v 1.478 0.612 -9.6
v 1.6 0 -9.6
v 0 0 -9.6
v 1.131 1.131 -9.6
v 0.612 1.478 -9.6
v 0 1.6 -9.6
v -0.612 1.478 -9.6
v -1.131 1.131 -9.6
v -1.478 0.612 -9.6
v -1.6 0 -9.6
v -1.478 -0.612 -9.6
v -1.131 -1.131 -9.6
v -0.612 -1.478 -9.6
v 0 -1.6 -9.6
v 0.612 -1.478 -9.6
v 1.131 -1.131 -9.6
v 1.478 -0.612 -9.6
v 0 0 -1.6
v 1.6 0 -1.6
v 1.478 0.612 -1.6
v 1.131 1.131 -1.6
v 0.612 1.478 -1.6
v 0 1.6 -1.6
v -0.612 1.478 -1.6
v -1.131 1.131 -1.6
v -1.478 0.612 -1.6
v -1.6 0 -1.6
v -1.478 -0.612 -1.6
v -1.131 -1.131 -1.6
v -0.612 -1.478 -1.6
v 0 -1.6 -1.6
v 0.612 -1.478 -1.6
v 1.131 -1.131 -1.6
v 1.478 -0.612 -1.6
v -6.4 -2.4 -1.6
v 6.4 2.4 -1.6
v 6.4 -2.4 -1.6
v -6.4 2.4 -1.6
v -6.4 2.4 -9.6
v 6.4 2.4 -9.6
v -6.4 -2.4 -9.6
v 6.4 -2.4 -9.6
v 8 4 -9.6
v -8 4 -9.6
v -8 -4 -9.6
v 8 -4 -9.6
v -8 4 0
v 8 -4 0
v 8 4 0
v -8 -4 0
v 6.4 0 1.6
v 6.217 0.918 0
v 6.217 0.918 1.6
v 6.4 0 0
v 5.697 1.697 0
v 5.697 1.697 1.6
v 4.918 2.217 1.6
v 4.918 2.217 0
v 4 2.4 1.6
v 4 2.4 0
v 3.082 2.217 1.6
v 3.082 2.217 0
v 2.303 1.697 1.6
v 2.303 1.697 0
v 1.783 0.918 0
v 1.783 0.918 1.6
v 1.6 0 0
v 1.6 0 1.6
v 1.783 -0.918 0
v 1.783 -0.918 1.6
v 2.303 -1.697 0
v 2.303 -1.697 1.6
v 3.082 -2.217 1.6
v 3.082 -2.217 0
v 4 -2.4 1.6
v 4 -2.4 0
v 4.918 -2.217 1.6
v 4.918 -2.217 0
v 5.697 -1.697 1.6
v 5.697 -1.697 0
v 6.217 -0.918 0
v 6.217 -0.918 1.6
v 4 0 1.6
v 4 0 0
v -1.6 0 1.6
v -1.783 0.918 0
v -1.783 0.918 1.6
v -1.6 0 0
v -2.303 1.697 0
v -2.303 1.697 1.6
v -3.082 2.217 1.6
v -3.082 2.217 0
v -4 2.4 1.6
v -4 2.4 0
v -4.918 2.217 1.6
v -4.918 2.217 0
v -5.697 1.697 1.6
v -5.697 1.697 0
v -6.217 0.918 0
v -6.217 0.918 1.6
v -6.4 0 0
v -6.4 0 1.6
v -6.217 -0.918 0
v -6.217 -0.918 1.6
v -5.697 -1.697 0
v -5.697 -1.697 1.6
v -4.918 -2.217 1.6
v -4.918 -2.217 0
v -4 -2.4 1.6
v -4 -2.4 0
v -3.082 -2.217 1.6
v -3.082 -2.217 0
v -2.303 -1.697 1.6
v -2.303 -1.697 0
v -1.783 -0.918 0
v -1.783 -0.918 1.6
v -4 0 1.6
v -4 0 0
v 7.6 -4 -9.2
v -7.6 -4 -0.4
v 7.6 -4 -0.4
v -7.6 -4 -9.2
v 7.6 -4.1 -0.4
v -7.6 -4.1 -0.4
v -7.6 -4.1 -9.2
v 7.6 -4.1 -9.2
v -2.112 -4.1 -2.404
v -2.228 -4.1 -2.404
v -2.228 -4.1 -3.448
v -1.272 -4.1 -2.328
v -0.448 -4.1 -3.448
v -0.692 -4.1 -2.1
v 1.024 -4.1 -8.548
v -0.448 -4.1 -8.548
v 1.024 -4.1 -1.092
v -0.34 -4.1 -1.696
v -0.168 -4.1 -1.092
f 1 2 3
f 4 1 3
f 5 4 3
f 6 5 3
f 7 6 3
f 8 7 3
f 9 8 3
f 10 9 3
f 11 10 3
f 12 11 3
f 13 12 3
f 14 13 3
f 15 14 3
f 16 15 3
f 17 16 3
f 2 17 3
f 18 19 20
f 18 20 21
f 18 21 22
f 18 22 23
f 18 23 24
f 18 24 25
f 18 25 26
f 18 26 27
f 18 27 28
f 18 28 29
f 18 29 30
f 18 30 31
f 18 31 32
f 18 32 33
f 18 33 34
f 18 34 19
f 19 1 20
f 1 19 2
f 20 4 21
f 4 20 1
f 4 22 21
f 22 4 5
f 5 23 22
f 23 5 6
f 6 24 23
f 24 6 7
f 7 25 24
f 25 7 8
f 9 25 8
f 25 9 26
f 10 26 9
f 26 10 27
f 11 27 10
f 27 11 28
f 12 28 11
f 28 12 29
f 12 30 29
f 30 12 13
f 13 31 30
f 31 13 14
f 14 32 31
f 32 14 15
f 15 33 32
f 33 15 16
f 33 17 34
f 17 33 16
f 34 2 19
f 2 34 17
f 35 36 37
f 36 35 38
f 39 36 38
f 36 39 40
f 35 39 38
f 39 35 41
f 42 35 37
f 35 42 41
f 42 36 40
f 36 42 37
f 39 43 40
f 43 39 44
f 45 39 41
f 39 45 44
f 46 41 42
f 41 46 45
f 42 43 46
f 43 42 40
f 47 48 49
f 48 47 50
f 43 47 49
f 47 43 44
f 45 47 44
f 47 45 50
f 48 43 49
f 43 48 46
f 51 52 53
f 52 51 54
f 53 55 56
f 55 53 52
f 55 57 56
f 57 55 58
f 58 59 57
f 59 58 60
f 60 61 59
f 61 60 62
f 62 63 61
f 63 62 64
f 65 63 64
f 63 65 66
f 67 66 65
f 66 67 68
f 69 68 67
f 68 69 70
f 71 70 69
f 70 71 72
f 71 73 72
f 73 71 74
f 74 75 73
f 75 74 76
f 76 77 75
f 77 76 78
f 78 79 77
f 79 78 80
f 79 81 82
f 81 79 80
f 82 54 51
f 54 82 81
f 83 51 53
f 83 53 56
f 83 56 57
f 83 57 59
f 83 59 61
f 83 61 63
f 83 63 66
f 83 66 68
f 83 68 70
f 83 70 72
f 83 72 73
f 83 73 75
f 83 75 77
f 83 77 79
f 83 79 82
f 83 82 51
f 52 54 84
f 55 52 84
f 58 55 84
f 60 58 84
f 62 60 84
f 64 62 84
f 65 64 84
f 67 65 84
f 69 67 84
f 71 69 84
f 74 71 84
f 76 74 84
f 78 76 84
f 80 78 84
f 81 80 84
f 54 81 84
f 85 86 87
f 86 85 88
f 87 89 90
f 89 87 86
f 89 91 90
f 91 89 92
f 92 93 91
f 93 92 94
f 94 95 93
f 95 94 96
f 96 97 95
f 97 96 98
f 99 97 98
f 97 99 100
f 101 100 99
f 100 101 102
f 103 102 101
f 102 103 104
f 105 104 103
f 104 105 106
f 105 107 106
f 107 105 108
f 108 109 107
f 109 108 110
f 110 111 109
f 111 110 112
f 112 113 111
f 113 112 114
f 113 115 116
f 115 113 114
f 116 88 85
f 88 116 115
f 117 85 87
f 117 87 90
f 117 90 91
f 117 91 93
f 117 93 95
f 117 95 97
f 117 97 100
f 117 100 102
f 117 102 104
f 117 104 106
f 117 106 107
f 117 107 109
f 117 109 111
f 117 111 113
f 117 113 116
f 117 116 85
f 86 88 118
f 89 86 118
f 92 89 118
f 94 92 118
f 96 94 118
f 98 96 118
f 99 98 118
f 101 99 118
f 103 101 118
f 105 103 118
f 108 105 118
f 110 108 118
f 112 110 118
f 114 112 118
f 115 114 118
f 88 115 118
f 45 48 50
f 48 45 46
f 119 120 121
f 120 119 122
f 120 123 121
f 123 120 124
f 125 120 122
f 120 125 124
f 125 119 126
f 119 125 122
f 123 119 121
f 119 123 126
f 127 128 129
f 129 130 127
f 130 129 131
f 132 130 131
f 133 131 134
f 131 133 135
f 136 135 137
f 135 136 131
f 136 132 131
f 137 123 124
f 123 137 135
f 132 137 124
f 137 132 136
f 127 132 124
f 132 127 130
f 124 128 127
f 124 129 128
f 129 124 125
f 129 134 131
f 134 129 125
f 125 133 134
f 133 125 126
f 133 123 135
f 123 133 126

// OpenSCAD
// file: ../p/4-4edge.scad
use <../lib.scad>
function ldraw_lib__4_4edge() = [
// 0 Circle 1.0
// 0 Name: 4-4edge.dat
// 0 Author: James Jessiman
// 0 !LDRAW_ORG Primitive UPDATE 2017-01
// 0 !LICENSE Licensed under CC BY 2.0 and CC BY 4.0 : see CAreadme.txt
// 
// 0 BFC CERTIFY CCW
  [0,"BFC","CERTIFY"],
  [0,"BFC","CCW"],
// 
// 0 !HISTORY 1998-12-15 [PTadmin] Official Update 1998-10
// 0 !HISTORY 2005-12-28 [PTadmin] Official Update 2005-01
// 0 !HISTORY 2007-06-24 [PTadmin] Header formatted for Contributor Agreement
// 0 !HISTORY 2008-07-01 [PTadmin] Official Update 2008-01
// 0 !HISTORY 2017-01-15 [Steffen] BFCed
// 0 !HISTORY 2017-12-30 [PTadmin] Official Update 2017-01
// 
// 
// 2 24 1 0 0 0.9239 0 0.3827
  [2,24,1,0,0,0.9239,0,0.3827],
// 2 24 0.9239 0 0.3827 0.7071 0 0.7071
  [2,24,0.9239,0,0.3827,0.7071,0,0.7071],
// 2 24 0.7071 0 0.7071 0.3827 0 0.9239
  [2,24,0.7071,0,0.7071,0.3827,0,0.9239],
// 2 24 0.3827 0 0.9239 0 0 1
  [2,24,0.3827,0,0.9239,0,0,1],
// 2 24 0 0 1 -0.3827 0 0.9239
  [2,24,0,0,1,-0.3827,0,0.9239],
// 2 24 -0.3827 0 0.9239 -0.7071 0 0.7071
  [2,24,-0.3827,0,0.9239,-0.7071,0,0.7071],
// 2 24 -0.7071 0 0.7071 -0.9239 0 0.3827
  [2,24,-0.7071,0,0.7071,-0.9239,0,0.3827],
// 2 24 -0.9239 0 0.3827 -1 0 -0
  [2,24,-0.9239,0,0.3827,-1,0,-0],
// 2 24 -1 0 -0 -0.9239 0 -0.3827
  [2,24,-1,0,-0,-0.9239,0,-0.3827],
// 2 24 -0.9239 0 -0.3827 -0.7071 0 -0.7071
  [2,24,-0.9239,0,-0.3827,-0.7071,0,-0.7071],
// 2 24 -0.7071 0 -0.7071 -0.3827 0 -0.9239
  [2,24,-0.7071,0,-0.7071,-0.3827,0,-0.9239],
// 2 24 -0.3827 0 -0.9239 0 0 -1
  [2,24,-0.3827,0,-0.9239,0,0,-1],
// 2 24 0 0 -1 0.3827 0 -0.9239
  [2,24,0,0,-1,0.3827,0,-0.9239],
// 2 24 0.3827 0 -0.9239 0.7071 0 -0.7071
  [2,24,0.3827,0,-0.9239,0.7071,0,-0.7071],
// 2 24 0.7071 0 -0.7071 0.9239 0 -0.3827
  [2,24,0.7071,0,-0.7071,0.9239,0,-0.3827],
// 2 24 0.9239 0 -0.3827 1 0 0
  [2,24,0.9239,0,-0.3827,1,0,0],
];
module ldraw_lib__4_4edge(step=0, col=false, unit=2/5, alt=false, line=0.2, solid=!$preview)
    makepoly(ldraw_lib__4_4edge(), step=step, col=col, unit=unit, alt=alt, line=line, solid=solid);
ldraw_lib__4_4edge(line=0.2);
// file: ../p/4-4disc.scad
use <../lib.scad>
function ldraw_lib__4_4disc() = [
// 0 Disc 1.0
// 0 Name: 4-4disc.dat
// 0 Author: James Jessiman
// 0 !LDRAW_ORG Primitive UPDATE 2002-02
// 0 !LICENSE Licensed under CC BY 2.0 and CC BY 4.0 : see CAreadme.txt
// 
// 0 BFC CERTIFY CCW
  [0,"BFC","CERTIFY"],
  [0,"BFC","CCW"],
// 
// 0 !HISTORY 1998-12-15 [PTadmin] Official Update 1998-10
// 0 !HISTORY 2002-03-23 [sbliss] Added BFC statement
// 0 !HISTORY 2002-04-25 [PTadmin] Official Update 2002-02
// 0 !HISTORY 2007-06-24 [PTadmin] Header formatted for Contributor Agreement
// 0 !HISTORY 2008-07-01 [PTadmin] Official Update 2008-01
// 
// 
// 3 16 0 0 0 1 0 0 0.9239 0 0.3827
  [3,16,0,0,0,1,0,0,0.9239,0,0.3827],
// 3 16 0 0 0 0.9239 0 0.3827 0.7071 0 0.7071
  [3,16,0,0,0,0.9239,0,0.3827,0.7071,0,0.7071],
// 3 16 0 0 0 0.7071 0 0.7071 0.3827 0 0.9239
  [3,16,0,0,0,0.7071,0,0.7071,0.3827,0,0.9239],
// 3 16 0 0 0 0.3827 0 0.9239 0 0 1
  [3,16,0,0,0,0.3827,0,0.9239,0,0,1],
// 3 16 0 0 0 0 0 1 -0.3827 0 0.9239
  [3,16,0,0,0,0,0,1,-0.3827,0,0.9239],
// 3 16 0 0 0 -0.3827 0 0.9239 -0.7071 0 0.7071
  [3,16,0,0,0,-0.3827,0,0.9239,-0.7071,0,0.7071],
// 3 16 0 0 0 -0.7071 0 0.7071 -0.9239 0 0.3827
  [3,16,0,0,0,-0.7071,0,0.7071,-0.9239,0,0.3827],
// 3 16 0 0 0 -0.9239 0 0.3827 -1 0 -0
  [3,16,0,0,0,-0.9239,0,0.3827,-1,0,-0],
// 3 16 0 0 0 -1 0 -0 -0.9239 0 -0.3827
  [3,16,0,0,0,-1,0,-0,-0.9239,0,-0.3827],
// 3 16 0 0 0 -0.9239 0 -0.3827 -0.7071 0 -0.7071
  [3,16,0,0,0,-0.9239,0,-0.3827,-0.7071,0,-0.7071],
// 3 16 0 0 0 -0.7071 0 -0.7071 -0.3827 0 -0.9239
  [3,16,0,0,0,-0.7071,0,-0.7071,-0.3827,0,-0.9239],
// 3 16 0 0 0 -0.3827 0 -0.9239 0 0 -1
  [3,16,0,0,0,-0.3827,0,-0.9239,0,0,-1],
// 3 16 0 0 0 0 0 -1 0.3827 0 -0.9239
  [3,16,0,0,0,0,0,-1,0.3827,0,-0.9239],
// 3 16 0 0 0 0.3827 0 -0.9239 0.7071 0 -0.7071
  [3,16,0,0,0,0.3827,0,-0.9239,0.7071,0,-0.7071],
// 3 16 0 0 0 0.7071 0 -0.7071 0.9239 0 -0.3827
  [3,16,0,0,0,0.7071,0,-0.7071,0.9239,0,-0.3827],
// 3 16 0 0 0 0.9239 0 -0.3827 1 0 0
  [3,16,0,0,0,0.9239,0,-0.3827,1,0,0],
// 0
];
module ldraw_lib__4_4disc(step=0, col=false, unit=2/5, alt=false, line=0.2, solid=!$preview)
    makepoly(ldraw_lib__4_4disc(), step=step, col=col, unit=unit, alt=alt, line=line, solid=solid);
ldraw_lib__4_4disc(line=0.2);
// file: ../p/4-4cyli.scad
use <../lib.scad>
$fa=1; $fs=0.2;
function ldraw_lib__4_4cyli(realsolid=false) = [
// 0 Cylinder 1.0
// 0 Name: 4-4cyli.dat
// 0 Author: James Jessiman
// 0 !LDRAW_ORG Primitive UPDATE 2005-01
// 0 !LICENSE Licensed under CC BY 2.0 and CC BY 4.0 : see CAreadme.txt
// 
// 0 BFC CERTIFY CCW
  [0,"BFC","CERTIFY"],
  [0,"BFC","CCW"],
// 
// 0 !HISTORY 1998-12-15 [PTadmin] Official Update 1998-10
// 0 !HISTORY 2002-03-23 [sbliss] Added BFC statement; merged headers from files in distributions LDraw 0.27 and Complete.
// 0 !HISTORY 2002-04-25 [PTadmin] Official Update 2002-02
// 0 !HISTORY 2004-12-14 [guyvivan] BFC CCW
// 0 !HISTORY 2005-12-28 [PTadmin] Official Update 2005-01
// 0 !HISTORY 2007-06-24 [PTadmin] Header formatted for Contributor Agreement
// 0 !HISTORY 2008-07-01 [PTadmin] Official Update 2008-01
// 
// 
// 4 16 1 1 0 0.9239 1 0.3827 0.9239 0 0.3827 1 0 0
  [4,16,1,1,0,0.9239,1,0.3827,0.9239,0,0.3827,1,0,0],
// 5 24 1 0 0 1 1 0 0.9239 0 0.3827 0.9239 0 -0.3827
  [5,24,1,0,0,1,1,0,0.9239,0,0.3827,0.9239,0,-0.3827],
// 4 16 0.9239 1 0.3827 0.7071 1 0.7071 0.7071 0 0.7071 0.9239 0 0.3827
  [4,16,0.9239,1,0.3827,0.7071,1,0.7071,0.7071,0,0.7071,0.9239,0,0.3827],
// 5 24 0.9239 0 0.3827 0.9239 1 0.3827 0.7071 0 0.7071 1 0 0
  [5,24,0.9239,0,0.3827,0.9239,1,0.3827,0.7071,0,0.7071,1,0,0],
// 4 16 0.7071 1 0.7071 0.3827 1 0.9239 0.3827 0 0.9239 0.7071 0 0.7071
  [4,16,0.7071,1,0.7071,0.3827,1,0.9239,0.3827,0,0.9239,0.7071,0,0.7071],
// 5 24 0.7071 0 0.7071 0.7071 1 0.7071 0.3827 0 0.9239 0.9239 0 0.3827
  [5,24,0.7071,0,0.7071,0.7071,1,0.7071,0.3827,0,0.9239,0.9239,0,0.3827],
// 4 16 0.3827 1 0.9239 0 1 1 0 0 1 0.3827 0 0.9239
  [4,16,0.3827,1,0.9239,0,1,1,0,0,1,0.3827,0,0.9239],
// 5 24 0.3827 0 0.9239 0.3827 1 0.9239 0 0 1 0.7071 0 0.7071
  [5,24,0.3827,0,0.9239,0.3827,1,0.9239,0,0,1,0.7071,0,0.7071],
// 4 16 0 1 1 -0.3827 1 0.9239 -0.3827 0 0.9239 0 0 1
  [4,16,0,1,1,-0.3827,1,0.9239,-0.3827,0,0.9239,0,0,1],
// 5 24 0 0 1 0 1 1 -0.3827 0 0.9239 0.3827 0 0.9239
  [5,24,0,0,1,0,1,1,-0.3827,0,0.9239,0.3827,0,0.9239],
// 4 16 -0.3827 1 0.9239 -0.7071 1 0.7071 -0.7071 0 0.7071 -0.3827 0 0.9239
  [4,16,-0.3827,1,0.9239,-0.7071,1,0.7071,-0.7071,0,0.7071,-0.3827,0,0.9239],
// 5 24 -0.3827 0 0.9239 -0.3827 1 0.9239 -0.7071 0 0.7071 0 0 1
  [5,24,-0.3827,0,0.9239,-0.3827,1,0.9239,-0.7071,0,0.7071,0,0,1],
// 4 16 -0.7071 1 0.7071 -0.9239 1 0.3827 -0.9239 0 0.3827 -0.7071 0 0.7071
  [4,16,-0.7071,1,0.7071,-0.9239,1,0.3827,-0.9239,0,0.3827,-0.7071,0,0.7071],
// 5 24 -0.7071 0 0.7071 -0.7071 1 0.7071 -0.9239 0 0.3827 -0.3827 0 0.9239
  [5,24,-0.7071,0,0.7071,-0.7071,1,0.7071,-0.9239,0,0.3827,-0.3827,0,0.9239],
// 4 16 -0.9239 1 0.3827 -1 1 0 -1 0 0 -0.9239 0 0.3827
  [4,16,-0.9239,1,0.3827,-1,1,0,-1,0,0,-0.9239,0,0.3827],
// 5 24 -0.9239 0 0.3827 -0.9239 1 0.3827 -1 0 0 -0.7071 0 0.7071
  [5,24,-0.9239,0,0.3827,-0.9239,1,0.3827,-1,0,0,-0.7071,0,0.7071],
// 4 16 -1 1 0 -0.9239 1 -0.3827 -0.9239 0 -0.3827 -1 0 0
  [4,16,-1,1,0,-0.9239,1,-0.3827,-0.9239,0,-0.3827,-1,0,0],
// 5 24 -1 0 0 -1 1 0 -0.9239 0 -0.3827 -0.9239 0 0.3827
  [5,24,-1,0,0,-1,1,0,-0.9239,0,-0.3827,-0.9239,0,0.3827],
// 4 16 -0.9239 1 -0.3827 -0.7071 1 -0.7071 -0.7071 0 -0.7071 -0.9239 0 -0.3827
  [4,16,-0.9239,1,-0.3827,-0.7071,1,-0.7071,-0.7071,0,-0.7071,-0.9239,0,-0.3827],
// 5 24 -0.9239 0 -0.3827 -0.9239 1 -0.3827 -0.7071 0 -0.7071 -1 0 0
  [5,24,-0.9239,0,-0.3827,-0.9239,1,-0.3827,-0.7071,0,-0.7071,-1,0,0],
// 4 16 -0.7071 1 -0.7071 -0.3827 1 -0.9239 -0.3827 0 -0.9239 -0.7071 0 -0.7071
  [4,16,-0.7071,1,-0.7071,-0.3827,1,-0.9239,-0.3827,0,-0.9239,-0.7071,0,-0.7071],
// 5 24 -0.7071 0 -0.7071 -0.7071 1 -0.7071 -0.3827 0 -0.9239 -0.9239 0 -0.3827
  [5,24,-0.7071,0,-0.7071,-0.7071,1,-0.7071,-0.3827,0,-0.9239,-0.9239,0,-0.3827],
// 4 16 -0.3827 1 -0.9239 0 1 -1 0 0 -1 -0.3827 0 -0.9239
  [4,16,-0.3827,1,-0.9239,0,1,-1,0,0,-1,-0.3827,0,-0.9239],
// 5 24 -0.3827 0 -0.9239 -0.3827 1 -0.9239 0 0 -1 -0.7071 0 -0.7071
  [5,24,-0.3827,0,-0.9239,-0.3827,1,-0.9239,0,0,-1,-0.7071,0,-0.7071],
// 4 16 0 1 -1 0.3827 1 -0.9239 0.3827 0 -0.9239 0 0 -1
  [4,16,0,1,-1,0.3827,1,-0.9239,0.3827,0,-0.9239,0,0,-1],
// 5 24 0 0 -1 0 1 -1 0.3827 0 -0.9239 -0.3827 0 -0.9239
  [5,24,0,0,-1,0,1,-1,0.3827,0,-0.9239,-0.3827,0,-0.9239],
// 4 16 0.3827 1 -0.9239 0.7071 1 -0.7071 0.7071 0 -0.7071 0.3827 0 -0.9239
  [4,16,0.3827,1,-0.9239,0.7071,1,-0.7071,0.7071,0,-0.7071,0.3827,0,-0.9239],
// 5 24 0.3827 0 -0.9239 0.3827 1 -0.9239 0.7071 0 -0.7071 0 0 -1
  [5,24,0.3827,0,-0.9239,0.3827,1,-0.9239,0.7071,0,-0.7071,0,0,-1],
// 4 16 0.7071 1 -0.7071 0.9239 1 -0.3827 0.9239 0 -0.3827 0.7071 0 -0.7071
  [4,16,0.7071,1,-0.7071,0.9239,1,-0.3827,0.9239,0,-0.3827,0.7071,0,-0.7071],
// 5 24 0.7071 0 -0.7071 0.7071 1 -0.7071 0.9239 0 -0.3827 0.3827 0 -0.9239
  [5,24,0.7071,0,-0.7071,0.7071,1,-0.7071,0.9239,0,-0.3827,0.3827,0,-0.9239],
// 4 16 0.9239 1 -0.3827 1 1 0 1 0 0 0.9239 0 -0.3827
  [4,16,0.9239,1,-0.3827,1,1,0,1,0,0,0.9239,0,-0.3827],
// 5 24 0.9239 0 -0.3827 0.9239 1 -0.3827 1 0 0 0.7071 0 -0.7071
  [5,24,0.9239,0,-0.3827,0.9239,1,-0.3827,1,0,0,0.7071,0,-0.7071],
// 0
];
module ldraw_lib__4_4cyli(step=0, col=false, unit=2/5, alt=false, line=0.2, solid=!$preview)
    makepoly(ldraw_lib__4_4cyli(solid), step=step, col=col, unit=unit, alt=alt, line=line, solid=solid);
ldraw_lib__4_4cyli(line=0.2);
// file: ../p/stud3.scad
use <../lib.scad>
use <4-4cyli.scad>
use <4-4disc.scad>
use <4-4edge.scad>
function ldraw_lib__stud3() = [
// 0 Stud Tube Solid
// 0 Name: stud3.dat
// 0 Author: James Jessiman
// 0 !LDRAW_ORG Primitive UPDATE 2012-01
// 0 !LICENSE Licensed under CC BY 4.0 : see CAreadme.txt
// 
// 0 BFC CERTIFY CCW
  [0,"BFC","CERTIFY"],
  [0,"BFC","CCW"],
// 
// 0 !HISTORY 2002-04-04 [sbliss] Modified for BFC compliance
// 0 !HISTORY 2002-04-25 [PTadmin] Official Update 2002-02
// 0 !HISTORY 2007-06-24 [PTadmin] Header formatted for Contributor Agreement
// 0 !HISTORY 2008-07-01 [PTadmin] Official Update 2008-01
// 0 !HISTORY 2012-02-16 [Philo] Changed to CCW
// 0 !HISTORY 2012-03-30 [PTadmin] Official Update 2012-01
// 
// 
// 1 16 0 -4 0 4 0 0 0 1 0 0 0 4 4-4edge.dat
  [1,16,0,-4,0,4,0,0,0,1,0,0,0,4, ldraw_lib__4_4edge()],
// 1 16 0 0 0 4 0 0 0 1 0 0 0 4 4-4edge.dat
  [1,16,0,0,0,4,0,0,0,1,0,0,0,4, ldraw_lib__4_4edge()],
// 1 16 0 -4 0 4 0 0 0 1 0 0 0 4 4-4disc.dat
  [1,16,0,-4,0,4,0,0,0,1,0,0,0,4, ldraw_lib__4_4disc()],
  [-1,16,0,0,0,4,0,0,0,-1,0,0,0,4, ldraw_lib__4_4disc()],
// 1 16 0 -4 0 4 0 0 0 4 0 0 0 4 4-4cyli.dat
  [1,16,0,-4,0,4,0,0,0,4,0,0,0,4, ldraw_lib__4_4cyli()],
];
module ldraw_lib__stud3(step=0, col=false, unit=2/5, alt=false, line=0.2, solid=!$preview)
    makepoly(ldraw_lib__stud3(), step=step, col=col, unit=unit, alt=alt, line=line, solid=solid);
ldraw_lib__stud3(line=0.2);
// file: ../p/stud.scad
use <../lib.scad>
use <4-4cyli.scad>
use <4-4disc.scad>
use <4-4edge.scad>
function ldraw_lib__stud() = [
// 0 Stud
// 0 Name: stud.dat
// 0 Author: James Jessiman
// 0 !LDRAW_ORG Primitive UPDATE 2012-01
// 0 !LICENSE Licensed under CC BY 4.0 : see CAreadme.txt
// 
// 0 BFC CERTIFY CCW
  [0,"BFC","CERTIFY"],
  [0,"BFC","CCW"],
// 
// 0 !HISTORY 2002-04-04 [sbliss] Modified for BFC compliance
// 0 !HISTORY 2002-04-25 [PTadmin] Official Update 2002-02
// 0 !HISTORY 2007-06-24 [PTadmin] Header formatted for Contributor Agreement
// 0 !HISTORY 2008-07-01 [PTadmin] Official Update 2008-01
// 0 !HISTORY 2012-02-16 [Philo] Changed to CCW
// 0 !HISTORY 2012-03-30 [PTadmin] Official Update 2012-01
// 
// 
// 1 16 0 0 0 6 0 0 0 1 0 0 0 6 4-4edge.dat
  [1,16,0,0,0,6,0,0,0,1,0,0,0,6, ldraw_lib__4_4edge()],
// 1 16 0 -4 0 6 0 0 0 1 0 0 0 6 4-4edge.dat
  [1,16,0,-4,0,6,0,0,0,1,0,0,0,6, ldraw_lib__4_4edge()],
// 1 16 0 0 0 6 0 0 0 -4 0 0 0 6 4-4cyli.dat
  [1,16,0,0,0,6,0,0,0,-4,0,0,0,6, ldraw_lib__4_4cyli()],
// 1 16 0 -4 0 6 0 0 0 1 0 0 0 6 4-4disc.dat
  [1,16,0,-4,0,6,0,0,0,1,0,0,0,6, ldraw_lib__4_4disc()],
  [-1,16,0,0,0,6,0,0,0,-1,0,0,0,6, ldraw_lib__4_4disc()],
];
module ldraw_lib__stud(step=0, col=false, unit=2/5, alt=false, line=0.2, solid=!$preview)
    makepoly(ldraw_lib__stud(), step=step, col=col, unit=unit, alt=alt, line=line, solid=solid);
ldraw_lib__stud(line=0.2);
// file: ../p/box5.scad
use <../lib.scad>
function ldraw_lib__box5() = [
// 0 Box with 5 Faces and All Edges
// 0 Name: box5.dat
// 0 Author: James Jessiman
// 0 !LDRAW_ORG Primitive UPDATE 2012-01
// 0 !LICENSE Licensed under CC BY 2.0 and CC BY 4.0 : see CAreadme.txt
// 
// 0 BFC CERTIFY CCW
  [0,"BFC","CERTIFY"],
  [0,"BFC","CCW"],
// 
// 0 !HISTORY 2002-04-03 [sbliss] Modified for BFC compliance
// 0 !HISTORY 2002-04-25 [PTadmin] Official Update 2002-02
// 0 !HISTORY 2007-06-24 [PTadmin] Header formatted for Contributor Agreement
// 0 !HISTORY 2008-07-01 [PTadmin] Official Update 2008-01
// 0 !HISTORY 2012-02-16 [Philo] Changed to CCW
// 0 !HISTORY 2012-03-30 [PTadmin] Official Update 2012-01
// 
// 
// 2 24 1 1 1 -1 1 1
  [2,24,1,1,1,-1,1,1],
// 2 24 -1 1 1 -1 1 -1
  [2,24,-1,1,1,-1,1,-1],
// 2 24 -1 1 -1 1 1 -1
  [2,24,-1,1,-1,1,1,-1],
// 2 24 1 1 -1 1 1 1
  [2,24,1,1,-1,1,1,1],
// 2 24 1 0 1 -1 0 1
  [2,24,1,0,1,-1,0,1],
// 2 24 -1 0 1 -1 0 -1
  [2,24,-1,0,1,-1,0,-1],
// 2 24 -1 0 -1 1 0 -1
  [2,24,-1,0,-1,1,0,-1],
// 2 24 1 0 -1 1 0 1
  [2,24,1,0,-1,1,0,1],
// 2 24 1 0 1 1 1 1
  [2,24,1,0,1,1,1,1],
// 2 24 -1 0 1 -1 1 1
  [2,24,-1,0,1,-1,1,1],
// 2 24 1 0 -1 1 1 -1
  [2,24,1,0,-1,1,1,-1],
// 2 24 -1 0 -1 -1 1 -1
  [2,24,-1,0,-1,-1,1,-1],
// 4 16 -1 1 1 1 1 1 1 1 -1 -1 1 -1
  [4,16,-1,1,1,1,1,1,1,1,-1,-1,1,-1],
// 4 16 -1 1 1 -1 0 1 1 0 1 1 1 1
  [4,16,-1,1,1,-1,0,1,1,0,1,1,1,1],
// 4 16 -1 1 -1 -1 0 -1 -1 0 1 -1 1 1
  [4,16,-1,1,-1,-1,0,-1,-1,0,1,-1,1,1],
// 4 16 1 1 -1 1 0 -1 -1 0 -1 -1 1 -1
  [4,16,1,1,-1,1,0,-1,-1,0,-1,-1,1,-1],
// 4 16 1 1 1 1 0 1 1 0 -1 1 1 -1
  [4,16,1,1,1,1,0,1,1,0,-1,1,1,-1],
];
makepoly(ldraw_lib__box5(), line=0.2);
// file: ../p/box4t.scad
use <../lib.scad>
function ldraw_lib__box4t() = [
// 0 Box with 4 Adjacent Faces and All Edges
// 0 Name: box4t.dat
// 0 Author: Tore Eriksson [Tore_Eriksson]
// 0 !LDRAW_ORG Primitive UPDATE 2003-02
// 0 !LICENSE Licensed under CC BY 2.0 and CC BY 4.0 : see CAreadme.txt
// 
// 0 BFC CERTIFY CCW
  [0,"BFC","CERTIFY"],
  [0,"BFC","CCW"],
// 
// 0 !HISTORY 1997-09-29 [PTadmin] Official Update 1997-15
// 0 !HISTORY 2002-08-31 [izanette] Modified with WINDZ for BFC compliance
// 0 !HISTORY 2003-08-01 [PTadmin] Official Update 2003-02
// 0 !HISTORY 2007-06-24 [PTadmin] Header formatted for Contributor Agreement
// 0 !HISTORY 2008-07-01 [PTadmin] Official Update 2008-01
// 
// 
// 2 24 1 1 1 -1 1 1
  [2,24,1,1,1,-1,1,1],
// 2 24 -1 1 1 -1 1 -1
  [2,24,-1,1,1,-1,1,-1],
// 2 24 -1 1 -1 1 1 -1
  [2,24,-1,1,-1,1,1,-1],
// 2 24 1 1 -1 1 1 1
  [2,24,1,1,-1,1,1,1],
// 2 24 1 0 1 -1 0 1
  [2,24,1,0,1,-1,0,1],
// 2 24 -1 0 1 -1 0 -1
  [2,24,-1,0,1,-1,0,-1],
// 2 24 -1 0 -1 1 0 -1
  [2,24,-1,0,-1,1,0,-1],
// 2 24 1 0 -1 1 0 1
  [2,24,1,0,-1,1,0,1],
// 2 24 1 0 1 1 1 1
  [2,24,1,0,1,1,1,1],
// 2 24 -1 0 1 -1 1 1
  [2,24,-1,0,1,-1,1,1],
// 2 24 1 0 -1 1 1 -1
  [2,24,1,0,-1,1,1,-1],
// 2 24 -1 0 -1 -1 1 -1
  [2,24,-1,0,-1,-1,1,-1],
// 4 16 1 1 1 1 1 -1 -1 1 -1 -1 1 1
  [4,16,1,1,1,1,1,-1,-1,1,-1,-1,1,1],
// 4 16 1 1 1 -1 1 1 -1 0 1 1 0 1
  [4,16,1,1,1,-1,1,1,-1,0,1,1,0,1],
// 4 16 -1 1 1 -1 1 -1 -1 0 -1 -1 0 1
  [4,16,-1,1,1,-1,1,-1,-1,0,-1,-1,0,1],
// 0 4 16 -1 1 -1 -1 0 -1 1 0 -1 1 1 -1
// 4 16 1 1 -1 1 1 1 1 0 1 1 0 -1
  [4,16,1,1,-1,1,1,1,1,0,1,1,0,-1],
// 0
];
makepoly(ldraw_lib__box4t(), line=0.2);
// file: s/3004s01.scad
use <../../lib.scad>
use <../../p/box4t.scad>
use <../../p/box5.scad>
use <../../p/stud.scad>
use <../../p/stud3.scad>
$fa=1; $fs=0.2;
function ldraw_lib__s__3004s01(realsolid=false) = [
// 0 ~Brick  1 x  2 without Front Face
// 0 Name: s\3004s01.dat
// 0 Author: James Jessiman
// 0 !LDRAW_ORG Subpart UPDATE 2003-03
// 0 !LICENSE Licensed under CC BY 2.0 and CC BY 4.0 : see CAreadme.txt
// 
// 0 BFC CERTIFY CCW
  [0,"BFC","CERTIFY"],
  [0,"BFC","CCW"],
// 
// 0 !HISTORY 2003-09-07 [jriley] Subfiling, BFC
// 0 !HISTORY 2003-12-19 [PTadmin] Official Update 2003-03
// 0 !HISTORY 2007-08-29 [PTadmin] Header formatted for Contributor Agreement
// 0 !HISTORY 2008-07-01 [PTadmin] Official Update 2008-01
// 
// 
// 1 16 0 4 0 1 0 0 0 -5 0 0 0 1 stud3.dat
  [1,16,0,4,0,1,0,0,0,-5,0,0,0,1, ldraw_lib__stud3(realsolid)],
// 0 BFC INVERTNEXT
  [0,"BFC","INVERTNEXT"],
// 1 16 0 24 0 16 0 0 0 -20 0 0 0 6 box5.dat
  [1,16,0,24,0,16,0,0,0,-20,0,0,0,6, ldraw_lib__box5(realsolid)],
// 4 16 20 24 10 16 24 6 -16 24 6 -20 24 10
  [4,16,20,24,10,16,24,6,-16,24,6,-20,24,10],
// 4 16 -20 24 10 -16 24 6 -16 24 -6 -20 24 -10
  [4,16,-20,24,10,-16,24,6,-16,24,-6,-20,24,-10],
// 4 16 -20 24 -10 -16 24 -6 16 24 -6 20 24 -10
  [4,16,-20,24,-10,-16,24,-6,16,24,-6,20,24,-10],
// 4 16 20 24 -10 16 24 -6 16 24 6 20 24 10
  [4,16,20,24,-10,16,24,-6,16,24,6,20,24,10],
// 1 16 0 24 0 20 0 0 0 -24 0 0 0 10 box4t.dat
  [1,16,0,24,0,20,0,0,0,-24,0,0,0,10, ldraw_lib__box4t(realsolid)],
// 1 16 10 0 0 1 0 0 0 1 0 0 0 1 stud.dat
  [1,16,10,0,0,1,0,0,0,1,0,0,0,1, ldraw_lib__stud(realsolid)],
// 1 16 -10 0 0 1 0 0 0 1 0 0 0 1 stud.dat
  [1,16,-10,0,0,1,0,0,0,1,0,0,0,1, ldraw_lib__stud(realsolid)],
// 0
];
module ldraw_lib__s__3004s01(step=0, col=false, unit=2/5, alt=false, line=0.2, solid=!$preview)
    makepoly(ldraw_lib__s__3004s01(solid), step=step, col=col, unit=unit, alt=alt, line=line, solid=solid);
ldraw_lib__s__3004s01(line=0.2);
// file: s/004452bs02.scad
use <../../lib.scad>
function ldraw_lib__s__004452bs02() = [
// 0 ~Sticker  1.1 x  1.9 with Number "1" - Background
// 0 Name: s\004452bs02.dat
// 0 Author: Takeshi Takahashi [RainbowDolphin]
// 0 !LDRAW_ORG Subpart UPDATE 2022-04
// 0 !LICENSE Licensed under CC BY 2.0 and CC BY 4.0 : see CAreadme.txt
// 
// 0 BFC CERTIFY CCW
  [0,"BFC","CERTIFY"],
  [0,"BFC","CCW"],
// 
// 0 !HISTORY 2022-07-18 [PTadmin] Official Update 2022-04
// 
// 
// 4 16 -19 -.25 11 -.42 -.25 9.27 2.56 -.25 9.27 19 -.25 11
  [4,16,-19,-.25,11,-.42,-.25,9.27,2.56,-.25,9.27,19,-.25,11],
// 4 16 -.85 -.25 7.76 -.42 -.25 9.27 -19 -.25 11 -1.73 -.25 6.75
  [4,16,-.85,-.25,7.76,-.42,-.25,9.27,-19,-.25,11,-1.73,-.25,6.75],
// 4 16 -3.18 -.25 6.18 -1.73 -.25 6.75 -19 -.25 11 -5.28 -.25 5.99
  [4,16,-3.18,-.25,6.18,-1.73,-.25,6.75,-19,-.25,11,-5.28,-.25,5.99],
// 3 16 -19 -.25 11 -5.57 -.25 5.99 -5.28 -.25 5.99
  [3,16,-19,-.25,11,-5.57,-.25,5.99,-5.28,-.25,5.99],
// 4 16 -5.57 -.25 3.38 -5.57 -.25 5.99 -19 -.25 11 -19 -.25 -11
  [4,16,-5.57,-.25,3.38,-5.57,-.25,5.99,-19,-.25,11,-19,-.25,-11],
// 4 16 -1.12 -.25 3.38 -5.57 -.25 3.38 -19 -.25 -11 -1.12 -.25 -9.37
  [4,16,-1.12,-.25,3.38,-5.57,-.25,3.38,-19,-.25,-11,-1.12,-.25,-9.37],
// 4 16 2.56 -.25 -9.37 -1.12 -.25 -9.37 -19 -.25 -11 19 -.25 -11
  [4,16,2.56,-.25,-9.37,-1.12,-.25,-9.37,-19,-.25,-11,19,-.25,-11],
// 4 16 2.56 -.25 9.27 2.56 -.25 -9.37 19 -.25 -11 19 -.25 11
  [4,16,2.56,-.25,9.27,2.56,-.25,-9.37,19,-.25,-11,19,-.25,11],
];
module ldraw_lib__s__004452bs02(step=0, col=false, unit=2/5, alt=false, line=0.2, solid=!$preview)
    makepoly(ldraw_lib__s__004452bs02(), step=step, col=col, unit=unit, alt=alt, line=line, solid=solid);
ldraw_lib__s__004452bs02(line=0.2);
// file: s/004452bs01.scad
use <../../lib.scad>
function ldraw_lib__s__004452bs01() = [
// 0 ~Sticker  1.1 x  1.9 with Number "1" - Type Face
// 0 Name: s\004452bs01.dat
// 0 Author: Takeshi Takahashi [RainbowDolphin]
// 0 !LDRAW_ORG Subpart UPDATE 2022-04
// 0 !LICENSE Licensed under CC BY 4.0 : see CAreadme.txt
// 
// 0 BFC CERTIFY CCW
  [0,"BFC","CERTIFY"],
  [0,"BFC","CCW"],
// 
// 0 !HISTORY 2022-07-18 [PTadmin] Official Update 2022-04
// 
// 
// 3 16 -5.28 -.25 5.99 -5.57 -.25 5.99 -5.57 -.25 3.38
  [3,16,-5.28,-.25,5.99,-5.57,-.25,5.99,-5.57,-.25,3.38],
// 4 16 -3.18 -.25 6.18 -5.28 -.25 5.99 -5.57 -.25 3.38 -1.12 -.25 3.38
  [4,16,-3.18,-.25,6.18,-5.28,-.25,5.99,-5.57,-.25,3.38,-1.12,-.25,3.38],
// 3 16 -1.73 -.25 6.75 -3.18 -.25 6.18 -1.12 -.25 3.38
  [3,16,-1.73,-.25,6.75,-3.18,-.25,6.18,-1.12,-.25,3.38],
// 4 16 -1.12 -.25 3.38 -1.12 -.25 -9.37 2.56 -.25 -9.37 2.56 -.25 9.27
  [4,16,-1.12,-.25,3.38,-1.12,-.25,-9.37,2.56,-.25,-9.37,2.56,-.25,9.27],
// 4 16 2.56 -.25 9.27 -.42 -.25 9.27 -.85 -.25 7.76 -1.12 -.25 3.38
  [4,16,2.56,-.25,9.27,-.42,-.25,9.27,-.85,-.25,7.76,-1.12,-.25,3.38],
// 3 16 -.85 -.25 7.76 -1.73 -.25 6.75 -1.12 -.25 3.38
  [3,16,-.85,-.25,7.76,-1.73,-.25,6.75,-1.12,-.25,3.38],
];
module ldraw_lib__s__004452bs01(step=0, col=false, unit=2/5, alt=false, line=0.2, solid=!$preview)
    makepoly(ldraw_lib__s__004452bs01(), step=step, col=col, unit=unit, alt=alt, line=line, solid=solid);
ldraw_lib__s__004452bs01(line=0.2);
// file: ../p/box5-12.scad
use <../lib.scad>
function ldraw_lib__box5_12() = [
// 0 Box with 5 Faces without Any Edges
// 0 Name: box5-12.dat
// 0 Author: Chris Dee [cwdee]
// 0 !LDRAW_ORG Primitive UPDATE 2009-02
// 0 !LICENSE Licensed under CC BY 2.0 and CC BY 4.0 : see CAreadme.txt
// 
// 0 BFC CERTIFY CCW
  [0,"BFC","CERTIFY"],
  [0,"BFC","CCW"],
// 
// 0 !HISTORY 2009-09-03 [PTadmin] Official Update 2009-02
// 
// 
// 4 16 1 1 1 1 1 -1 -1 1 -1 -1 1 1
  [4,16,1,1,1,1,1,-1,-1,1,-1,-1,1,1],
// 4 16 -1 0 1 1 0 1 1 1 1 -1 1 1
  [4,16,-1,0,1,1,0,1,1,1,1,-1,1,1],
// 4 16 -1 0 -1 -1 0 1 -1 1 1 -1 1 -1
  [4,16,-1,0,-1,-1,0,1,-1,1,1,-1,1,-1],
// 4 16 1 0 -1 -1 0 -1 -1 1 -1 1 1 -1
  [4,16,1,0,-1,-1,0,-1,-1,1,-1,1,1,-1],
// 4 16 1 0 1 1 0 -1 1 1 -1 1 1 1
  [4,16,1,0,1,1,0,-1,1,1,-1,1,1,1],
// 0
];
module ldraw_lib__box5_12(step=0, col=false, unit=2/5, alt=false, line=0.2, solid=!$preview)
    makepoly(ldraw_lib__box5_12(), step=step, col=col, unit=unit, alt=alt, line=line, solid=solid);
ldraw_lib__box5_12(line=0.2);
// file: 3004.scad
use <../lib.scad>
use <s/3004s01.scad>
function ldraw_lib__3004() = [
// 0 Brick  1 x  2
// 0 Name: 3004.dat
// 0 Author: James Jessiman
// 0 !LDRAW_ORG Part UPDATE 2022-05
// 0 !LICENSE Licensed under CC BY 2.0 and CC BY 4.0 : see CAreadme.txt
// 
// 0 BFC CERTIFY CCW
  [0,"BFC","CERTIFY"],
  [0,"BFC","CCW"],
// 
// 0 !HISTORY 2001-10-26 [PTadmin] Official Update 2001-01
// 0 !HISTORY 2002-05-07 {unknown} BFC Certification
// 0 !HISTORY 2002-06-11 [PTadmin] Official Update 2002-03
// 0 !HISTORY 2007-05-07 [PTadmin] Header formatted for Contributor Agreement
// 0 !HISTORY 2008-07-01 [PTadmin] Official Update 2008-01
// 0 !HISTORY 2022-08-04 [MagFors] Using subfile
// 0 !HISTORY 2022-09-15 [PTadmin] Official Update 2022-05
// 
// 
// 1 16 0 0 0 1 0 0 0 1 0 0 0 1 s\3004s01.dat
  [1,16,0,0,0,1,0,0,0,1,0,0,0,1, ldraw_lib__s__3004s01()],
// 4 16 -20 24 -10 20 24 -10 20 0 -10 -20 0 -10
  [4,16,-20,24,-10,20,24,-10,20,0,-10,-20,0,-10],
];
module ldraw_lib__3004(step=0, col=false, unit=2/5, alt=false, line=0.2, solid=!$preview)
    makepoly(ldraw_lib__3004(), step=step, col=col, unit=unit, alt=alt, line=line, solid=solid);
ldraw_lib__3004(line=0.2);
// file: 004452b.scad
use <../lib.scad>
use <../p/box5-12.scad>
use <s/004452bs01.scad>
use <s/004452bs02.scad>
function ldraw_lib__004452b() = [
// 0 Sticker  1.1 x  1.9 with Black Number "1" on Yellow Background
// 0 Name: 004452b.dat
// 0 Author: Takeshi Takahashi [RainbowDolphin]
// 0 !LDRAW_ORG Part UPDATE 2022-04
// 0 !LICENSE Licensed under CC BY 4.0 : see CAreadme.txt
// 
// 0 BFC CERTIFY CCW
  [0,"BFC","CERTIFY"],
  [0,"BFC","CCW"],
// 
// 0 !KEYWORDS Fire Station, Set 374-1
// 
// 0 !HISTORY 2022-07-18 [PTadmin] Official Update 2022-04
// 
// 
// 1 16 0 -0.25 0 19 0 0 0 0.25 0 0 0 11 box5-12.dat
  [1,16,0,-0.25,0,19,0,0,0,0.25,0,0,0,11, ldraw_lib__box5_12()],
// 1 0 0 0 0 1 0 0 0 1 0 0 0 1 s\004452bs01.dat
  [1,0,0,0,0,1,0,0,0,1,0,0,0,1, ldraw_lib__s__004452bs01()],
// 1 14 0 0 0 1 0 0 0 1 0 0 0 1 s\004452bs02.dat
  [1,14,0,0,0,1,0,0,0,1,0,0,0,1, ldraw_lib__s__004452bs02()],
];
module ldraw_lib__004452b(step=0, col=false, unit=2/5, alt=false, line=0.2, solid=!$preview)
    makepoly(ldraw_lib__004452b(), step=step, col=col, unit=unit, alt=alt, line=line, solid=solid);
ldraw_lib__004452b(line=0.2);
// main file
use <../lib.scad>
use <004452b.scad>
use <3004.scad>
function ldraw_lib__3004d07() = [
// 0 Brick  1 x  2 with Black Number "1" on Yellow Background Sticker
// 0 Name: 3004d07.dat
// 0 Author: Takeshi Takahashi [RainbowDolphin]
// 0 !LDRAW_ORG Shortcut UPDATE 2024-04
// 0 !LICENSE Licensed under CC BY 4.0 : see CAreadme.txt
// 
// 0 BFC CERTIFY CCW
  [0,"BFC","CERTIFY"],
  [0,"BFC","CCW"],
// 
// 0 !CATEGORY Sticker Shortcut
// 0 !KEYWORDS Bricklink 3004pb001, Fire Station, Set 374-1
// 
// 0 !HISTORY 2024-05-28 [OrionP] Official Update 2024-04
// 
// 1 16 0 0 0 1 0 0 0 1 0 0 0 1 3004.dat
  [1,16,0,0,0,1,0,0,0,1,0,0,0,1, ldraw_lib__3004()],
// 1 16 0 12 -10 1 0 0 0 0 -1 0 1 0 004452b.dat
  [1,16,0,12,-10,1,0,0,0,0,-1,0,1,0, ldraw_lib__004452b()],
];
module ldraw_lib__3004d07(step=0, col=false, unit=2/5, alt=false, line=0.2, solid=!$preview)
    makepoly(ldraw_lib__3004d07(), step=step, col=col, unit=unit, alt=alt, line=line, solid=solid);
ldraw_lib__3004d07(line=0.2);
